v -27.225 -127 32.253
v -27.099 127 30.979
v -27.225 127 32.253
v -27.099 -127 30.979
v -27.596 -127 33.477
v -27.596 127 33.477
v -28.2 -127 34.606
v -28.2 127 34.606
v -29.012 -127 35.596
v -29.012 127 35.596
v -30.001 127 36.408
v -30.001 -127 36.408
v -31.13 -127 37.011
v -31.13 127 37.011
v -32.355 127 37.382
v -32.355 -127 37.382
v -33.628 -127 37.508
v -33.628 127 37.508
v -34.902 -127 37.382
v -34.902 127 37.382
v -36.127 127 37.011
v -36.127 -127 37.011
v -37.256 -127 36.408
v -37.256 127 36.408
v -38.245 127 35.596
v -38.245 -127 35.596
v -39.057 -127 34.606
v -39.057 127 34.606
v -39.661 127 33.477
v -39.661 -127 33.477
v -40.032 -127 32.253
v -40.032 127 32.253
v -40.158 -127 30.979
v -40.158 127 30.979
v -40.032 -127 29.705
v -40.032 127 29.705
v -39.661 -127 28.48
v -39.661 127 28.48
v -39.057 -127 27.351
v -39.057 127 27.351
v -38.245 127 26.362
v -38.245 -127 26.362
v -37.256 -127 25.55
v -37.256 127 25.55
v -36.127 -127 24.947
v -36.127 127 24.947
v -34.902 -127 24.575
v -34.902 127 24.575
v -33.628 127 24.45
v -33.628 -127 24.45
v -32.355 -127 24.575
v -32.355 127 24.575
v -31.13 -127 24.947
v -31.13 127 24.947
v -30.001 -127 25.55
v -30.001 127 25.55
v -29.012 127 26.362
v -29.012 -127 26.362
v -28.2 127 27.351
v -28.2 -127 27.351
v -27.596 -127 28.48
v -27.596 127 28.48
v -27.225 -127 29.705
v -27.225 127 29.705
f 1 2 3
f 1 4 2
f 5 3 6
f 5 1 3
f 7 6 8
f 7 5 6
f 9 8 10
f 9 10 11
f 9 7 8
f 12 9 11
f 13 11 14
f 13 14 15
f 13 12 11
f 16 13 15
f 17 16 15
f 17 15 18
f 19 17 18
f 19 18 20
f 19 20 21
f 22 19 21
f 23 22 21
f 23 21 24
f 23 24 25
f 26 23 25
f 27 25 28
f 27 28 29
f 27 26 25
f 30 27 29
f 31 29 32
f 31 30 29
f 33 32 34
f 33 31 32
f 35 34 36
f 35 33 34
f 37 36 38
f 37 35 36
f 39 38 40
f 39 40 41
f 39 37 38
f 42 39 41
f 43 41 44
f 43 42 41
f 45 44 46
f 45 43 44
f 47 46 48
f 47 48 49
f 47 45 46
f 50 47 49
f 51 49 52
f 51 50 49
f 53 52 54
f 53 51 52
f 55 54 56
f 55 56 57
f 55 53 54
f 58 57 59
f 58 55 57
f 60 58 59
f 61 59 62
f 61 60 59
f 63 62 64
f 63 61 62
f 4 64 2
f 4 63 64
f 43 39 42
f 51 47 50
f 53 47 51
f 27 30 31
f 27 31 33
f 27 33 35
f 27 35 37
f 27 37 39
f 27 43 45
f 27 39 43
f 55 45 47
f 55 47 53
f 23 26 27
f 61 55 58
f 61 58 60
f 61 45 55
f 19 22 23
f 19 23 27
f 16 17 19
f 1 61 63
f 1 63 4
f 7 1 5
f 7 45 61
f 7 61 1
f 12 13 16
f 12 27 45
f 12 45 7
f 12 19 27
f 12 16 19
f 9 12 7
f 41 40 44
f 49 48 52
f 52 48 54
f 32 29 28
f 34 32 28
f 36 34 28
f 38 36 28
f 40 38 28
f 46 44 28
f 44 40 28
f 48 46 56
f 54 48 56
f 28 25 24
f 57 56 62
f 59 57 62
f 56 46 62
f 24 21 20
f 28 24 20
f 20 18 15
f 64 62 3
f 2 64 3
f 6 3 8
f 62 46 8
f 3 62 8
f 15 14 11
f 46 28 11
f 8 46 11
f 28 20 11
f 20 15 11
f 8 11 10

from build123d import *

# Parameters (mm, degrees)
F0_R     = 13.3568816407
F1_DEPTH = 127
F3_R     = 6.35
F4_DEPTH = 127
F6_R     = 6.5291630237
F7_DEPTH = 127


with BuildPart() as f1:
    # F0 (on Top) → F1 (new body, symmetric)
    with BuildSketch(Plane.XY):
        with Locations((-30.3778361085, 35.4953636827)):
            Circle(F0_R)
    extrude(amount=F1_DEPTH, both=True)


with BuildPart() as f4:
    # F3 (on Top) → F4 (new body, symmetric)
    with BuildSketch(Plane.XY):
        with Locations((-33.7284424831, 38.4713762078)):
            Circle(F3_R)
    extrude(amount=F4_DEPTH, both=True)


with BuildPart() as f7:
    # F6 (on Front) → F7 (new body, symmetric)
    with BuildSketch(Plane.XZ):
        with Locations((-33.6283754377, 30.9787562468)):
            Circle(F6_R)
    extrude(amount=F7_DEPTH, both=True)


solid = f7.part
